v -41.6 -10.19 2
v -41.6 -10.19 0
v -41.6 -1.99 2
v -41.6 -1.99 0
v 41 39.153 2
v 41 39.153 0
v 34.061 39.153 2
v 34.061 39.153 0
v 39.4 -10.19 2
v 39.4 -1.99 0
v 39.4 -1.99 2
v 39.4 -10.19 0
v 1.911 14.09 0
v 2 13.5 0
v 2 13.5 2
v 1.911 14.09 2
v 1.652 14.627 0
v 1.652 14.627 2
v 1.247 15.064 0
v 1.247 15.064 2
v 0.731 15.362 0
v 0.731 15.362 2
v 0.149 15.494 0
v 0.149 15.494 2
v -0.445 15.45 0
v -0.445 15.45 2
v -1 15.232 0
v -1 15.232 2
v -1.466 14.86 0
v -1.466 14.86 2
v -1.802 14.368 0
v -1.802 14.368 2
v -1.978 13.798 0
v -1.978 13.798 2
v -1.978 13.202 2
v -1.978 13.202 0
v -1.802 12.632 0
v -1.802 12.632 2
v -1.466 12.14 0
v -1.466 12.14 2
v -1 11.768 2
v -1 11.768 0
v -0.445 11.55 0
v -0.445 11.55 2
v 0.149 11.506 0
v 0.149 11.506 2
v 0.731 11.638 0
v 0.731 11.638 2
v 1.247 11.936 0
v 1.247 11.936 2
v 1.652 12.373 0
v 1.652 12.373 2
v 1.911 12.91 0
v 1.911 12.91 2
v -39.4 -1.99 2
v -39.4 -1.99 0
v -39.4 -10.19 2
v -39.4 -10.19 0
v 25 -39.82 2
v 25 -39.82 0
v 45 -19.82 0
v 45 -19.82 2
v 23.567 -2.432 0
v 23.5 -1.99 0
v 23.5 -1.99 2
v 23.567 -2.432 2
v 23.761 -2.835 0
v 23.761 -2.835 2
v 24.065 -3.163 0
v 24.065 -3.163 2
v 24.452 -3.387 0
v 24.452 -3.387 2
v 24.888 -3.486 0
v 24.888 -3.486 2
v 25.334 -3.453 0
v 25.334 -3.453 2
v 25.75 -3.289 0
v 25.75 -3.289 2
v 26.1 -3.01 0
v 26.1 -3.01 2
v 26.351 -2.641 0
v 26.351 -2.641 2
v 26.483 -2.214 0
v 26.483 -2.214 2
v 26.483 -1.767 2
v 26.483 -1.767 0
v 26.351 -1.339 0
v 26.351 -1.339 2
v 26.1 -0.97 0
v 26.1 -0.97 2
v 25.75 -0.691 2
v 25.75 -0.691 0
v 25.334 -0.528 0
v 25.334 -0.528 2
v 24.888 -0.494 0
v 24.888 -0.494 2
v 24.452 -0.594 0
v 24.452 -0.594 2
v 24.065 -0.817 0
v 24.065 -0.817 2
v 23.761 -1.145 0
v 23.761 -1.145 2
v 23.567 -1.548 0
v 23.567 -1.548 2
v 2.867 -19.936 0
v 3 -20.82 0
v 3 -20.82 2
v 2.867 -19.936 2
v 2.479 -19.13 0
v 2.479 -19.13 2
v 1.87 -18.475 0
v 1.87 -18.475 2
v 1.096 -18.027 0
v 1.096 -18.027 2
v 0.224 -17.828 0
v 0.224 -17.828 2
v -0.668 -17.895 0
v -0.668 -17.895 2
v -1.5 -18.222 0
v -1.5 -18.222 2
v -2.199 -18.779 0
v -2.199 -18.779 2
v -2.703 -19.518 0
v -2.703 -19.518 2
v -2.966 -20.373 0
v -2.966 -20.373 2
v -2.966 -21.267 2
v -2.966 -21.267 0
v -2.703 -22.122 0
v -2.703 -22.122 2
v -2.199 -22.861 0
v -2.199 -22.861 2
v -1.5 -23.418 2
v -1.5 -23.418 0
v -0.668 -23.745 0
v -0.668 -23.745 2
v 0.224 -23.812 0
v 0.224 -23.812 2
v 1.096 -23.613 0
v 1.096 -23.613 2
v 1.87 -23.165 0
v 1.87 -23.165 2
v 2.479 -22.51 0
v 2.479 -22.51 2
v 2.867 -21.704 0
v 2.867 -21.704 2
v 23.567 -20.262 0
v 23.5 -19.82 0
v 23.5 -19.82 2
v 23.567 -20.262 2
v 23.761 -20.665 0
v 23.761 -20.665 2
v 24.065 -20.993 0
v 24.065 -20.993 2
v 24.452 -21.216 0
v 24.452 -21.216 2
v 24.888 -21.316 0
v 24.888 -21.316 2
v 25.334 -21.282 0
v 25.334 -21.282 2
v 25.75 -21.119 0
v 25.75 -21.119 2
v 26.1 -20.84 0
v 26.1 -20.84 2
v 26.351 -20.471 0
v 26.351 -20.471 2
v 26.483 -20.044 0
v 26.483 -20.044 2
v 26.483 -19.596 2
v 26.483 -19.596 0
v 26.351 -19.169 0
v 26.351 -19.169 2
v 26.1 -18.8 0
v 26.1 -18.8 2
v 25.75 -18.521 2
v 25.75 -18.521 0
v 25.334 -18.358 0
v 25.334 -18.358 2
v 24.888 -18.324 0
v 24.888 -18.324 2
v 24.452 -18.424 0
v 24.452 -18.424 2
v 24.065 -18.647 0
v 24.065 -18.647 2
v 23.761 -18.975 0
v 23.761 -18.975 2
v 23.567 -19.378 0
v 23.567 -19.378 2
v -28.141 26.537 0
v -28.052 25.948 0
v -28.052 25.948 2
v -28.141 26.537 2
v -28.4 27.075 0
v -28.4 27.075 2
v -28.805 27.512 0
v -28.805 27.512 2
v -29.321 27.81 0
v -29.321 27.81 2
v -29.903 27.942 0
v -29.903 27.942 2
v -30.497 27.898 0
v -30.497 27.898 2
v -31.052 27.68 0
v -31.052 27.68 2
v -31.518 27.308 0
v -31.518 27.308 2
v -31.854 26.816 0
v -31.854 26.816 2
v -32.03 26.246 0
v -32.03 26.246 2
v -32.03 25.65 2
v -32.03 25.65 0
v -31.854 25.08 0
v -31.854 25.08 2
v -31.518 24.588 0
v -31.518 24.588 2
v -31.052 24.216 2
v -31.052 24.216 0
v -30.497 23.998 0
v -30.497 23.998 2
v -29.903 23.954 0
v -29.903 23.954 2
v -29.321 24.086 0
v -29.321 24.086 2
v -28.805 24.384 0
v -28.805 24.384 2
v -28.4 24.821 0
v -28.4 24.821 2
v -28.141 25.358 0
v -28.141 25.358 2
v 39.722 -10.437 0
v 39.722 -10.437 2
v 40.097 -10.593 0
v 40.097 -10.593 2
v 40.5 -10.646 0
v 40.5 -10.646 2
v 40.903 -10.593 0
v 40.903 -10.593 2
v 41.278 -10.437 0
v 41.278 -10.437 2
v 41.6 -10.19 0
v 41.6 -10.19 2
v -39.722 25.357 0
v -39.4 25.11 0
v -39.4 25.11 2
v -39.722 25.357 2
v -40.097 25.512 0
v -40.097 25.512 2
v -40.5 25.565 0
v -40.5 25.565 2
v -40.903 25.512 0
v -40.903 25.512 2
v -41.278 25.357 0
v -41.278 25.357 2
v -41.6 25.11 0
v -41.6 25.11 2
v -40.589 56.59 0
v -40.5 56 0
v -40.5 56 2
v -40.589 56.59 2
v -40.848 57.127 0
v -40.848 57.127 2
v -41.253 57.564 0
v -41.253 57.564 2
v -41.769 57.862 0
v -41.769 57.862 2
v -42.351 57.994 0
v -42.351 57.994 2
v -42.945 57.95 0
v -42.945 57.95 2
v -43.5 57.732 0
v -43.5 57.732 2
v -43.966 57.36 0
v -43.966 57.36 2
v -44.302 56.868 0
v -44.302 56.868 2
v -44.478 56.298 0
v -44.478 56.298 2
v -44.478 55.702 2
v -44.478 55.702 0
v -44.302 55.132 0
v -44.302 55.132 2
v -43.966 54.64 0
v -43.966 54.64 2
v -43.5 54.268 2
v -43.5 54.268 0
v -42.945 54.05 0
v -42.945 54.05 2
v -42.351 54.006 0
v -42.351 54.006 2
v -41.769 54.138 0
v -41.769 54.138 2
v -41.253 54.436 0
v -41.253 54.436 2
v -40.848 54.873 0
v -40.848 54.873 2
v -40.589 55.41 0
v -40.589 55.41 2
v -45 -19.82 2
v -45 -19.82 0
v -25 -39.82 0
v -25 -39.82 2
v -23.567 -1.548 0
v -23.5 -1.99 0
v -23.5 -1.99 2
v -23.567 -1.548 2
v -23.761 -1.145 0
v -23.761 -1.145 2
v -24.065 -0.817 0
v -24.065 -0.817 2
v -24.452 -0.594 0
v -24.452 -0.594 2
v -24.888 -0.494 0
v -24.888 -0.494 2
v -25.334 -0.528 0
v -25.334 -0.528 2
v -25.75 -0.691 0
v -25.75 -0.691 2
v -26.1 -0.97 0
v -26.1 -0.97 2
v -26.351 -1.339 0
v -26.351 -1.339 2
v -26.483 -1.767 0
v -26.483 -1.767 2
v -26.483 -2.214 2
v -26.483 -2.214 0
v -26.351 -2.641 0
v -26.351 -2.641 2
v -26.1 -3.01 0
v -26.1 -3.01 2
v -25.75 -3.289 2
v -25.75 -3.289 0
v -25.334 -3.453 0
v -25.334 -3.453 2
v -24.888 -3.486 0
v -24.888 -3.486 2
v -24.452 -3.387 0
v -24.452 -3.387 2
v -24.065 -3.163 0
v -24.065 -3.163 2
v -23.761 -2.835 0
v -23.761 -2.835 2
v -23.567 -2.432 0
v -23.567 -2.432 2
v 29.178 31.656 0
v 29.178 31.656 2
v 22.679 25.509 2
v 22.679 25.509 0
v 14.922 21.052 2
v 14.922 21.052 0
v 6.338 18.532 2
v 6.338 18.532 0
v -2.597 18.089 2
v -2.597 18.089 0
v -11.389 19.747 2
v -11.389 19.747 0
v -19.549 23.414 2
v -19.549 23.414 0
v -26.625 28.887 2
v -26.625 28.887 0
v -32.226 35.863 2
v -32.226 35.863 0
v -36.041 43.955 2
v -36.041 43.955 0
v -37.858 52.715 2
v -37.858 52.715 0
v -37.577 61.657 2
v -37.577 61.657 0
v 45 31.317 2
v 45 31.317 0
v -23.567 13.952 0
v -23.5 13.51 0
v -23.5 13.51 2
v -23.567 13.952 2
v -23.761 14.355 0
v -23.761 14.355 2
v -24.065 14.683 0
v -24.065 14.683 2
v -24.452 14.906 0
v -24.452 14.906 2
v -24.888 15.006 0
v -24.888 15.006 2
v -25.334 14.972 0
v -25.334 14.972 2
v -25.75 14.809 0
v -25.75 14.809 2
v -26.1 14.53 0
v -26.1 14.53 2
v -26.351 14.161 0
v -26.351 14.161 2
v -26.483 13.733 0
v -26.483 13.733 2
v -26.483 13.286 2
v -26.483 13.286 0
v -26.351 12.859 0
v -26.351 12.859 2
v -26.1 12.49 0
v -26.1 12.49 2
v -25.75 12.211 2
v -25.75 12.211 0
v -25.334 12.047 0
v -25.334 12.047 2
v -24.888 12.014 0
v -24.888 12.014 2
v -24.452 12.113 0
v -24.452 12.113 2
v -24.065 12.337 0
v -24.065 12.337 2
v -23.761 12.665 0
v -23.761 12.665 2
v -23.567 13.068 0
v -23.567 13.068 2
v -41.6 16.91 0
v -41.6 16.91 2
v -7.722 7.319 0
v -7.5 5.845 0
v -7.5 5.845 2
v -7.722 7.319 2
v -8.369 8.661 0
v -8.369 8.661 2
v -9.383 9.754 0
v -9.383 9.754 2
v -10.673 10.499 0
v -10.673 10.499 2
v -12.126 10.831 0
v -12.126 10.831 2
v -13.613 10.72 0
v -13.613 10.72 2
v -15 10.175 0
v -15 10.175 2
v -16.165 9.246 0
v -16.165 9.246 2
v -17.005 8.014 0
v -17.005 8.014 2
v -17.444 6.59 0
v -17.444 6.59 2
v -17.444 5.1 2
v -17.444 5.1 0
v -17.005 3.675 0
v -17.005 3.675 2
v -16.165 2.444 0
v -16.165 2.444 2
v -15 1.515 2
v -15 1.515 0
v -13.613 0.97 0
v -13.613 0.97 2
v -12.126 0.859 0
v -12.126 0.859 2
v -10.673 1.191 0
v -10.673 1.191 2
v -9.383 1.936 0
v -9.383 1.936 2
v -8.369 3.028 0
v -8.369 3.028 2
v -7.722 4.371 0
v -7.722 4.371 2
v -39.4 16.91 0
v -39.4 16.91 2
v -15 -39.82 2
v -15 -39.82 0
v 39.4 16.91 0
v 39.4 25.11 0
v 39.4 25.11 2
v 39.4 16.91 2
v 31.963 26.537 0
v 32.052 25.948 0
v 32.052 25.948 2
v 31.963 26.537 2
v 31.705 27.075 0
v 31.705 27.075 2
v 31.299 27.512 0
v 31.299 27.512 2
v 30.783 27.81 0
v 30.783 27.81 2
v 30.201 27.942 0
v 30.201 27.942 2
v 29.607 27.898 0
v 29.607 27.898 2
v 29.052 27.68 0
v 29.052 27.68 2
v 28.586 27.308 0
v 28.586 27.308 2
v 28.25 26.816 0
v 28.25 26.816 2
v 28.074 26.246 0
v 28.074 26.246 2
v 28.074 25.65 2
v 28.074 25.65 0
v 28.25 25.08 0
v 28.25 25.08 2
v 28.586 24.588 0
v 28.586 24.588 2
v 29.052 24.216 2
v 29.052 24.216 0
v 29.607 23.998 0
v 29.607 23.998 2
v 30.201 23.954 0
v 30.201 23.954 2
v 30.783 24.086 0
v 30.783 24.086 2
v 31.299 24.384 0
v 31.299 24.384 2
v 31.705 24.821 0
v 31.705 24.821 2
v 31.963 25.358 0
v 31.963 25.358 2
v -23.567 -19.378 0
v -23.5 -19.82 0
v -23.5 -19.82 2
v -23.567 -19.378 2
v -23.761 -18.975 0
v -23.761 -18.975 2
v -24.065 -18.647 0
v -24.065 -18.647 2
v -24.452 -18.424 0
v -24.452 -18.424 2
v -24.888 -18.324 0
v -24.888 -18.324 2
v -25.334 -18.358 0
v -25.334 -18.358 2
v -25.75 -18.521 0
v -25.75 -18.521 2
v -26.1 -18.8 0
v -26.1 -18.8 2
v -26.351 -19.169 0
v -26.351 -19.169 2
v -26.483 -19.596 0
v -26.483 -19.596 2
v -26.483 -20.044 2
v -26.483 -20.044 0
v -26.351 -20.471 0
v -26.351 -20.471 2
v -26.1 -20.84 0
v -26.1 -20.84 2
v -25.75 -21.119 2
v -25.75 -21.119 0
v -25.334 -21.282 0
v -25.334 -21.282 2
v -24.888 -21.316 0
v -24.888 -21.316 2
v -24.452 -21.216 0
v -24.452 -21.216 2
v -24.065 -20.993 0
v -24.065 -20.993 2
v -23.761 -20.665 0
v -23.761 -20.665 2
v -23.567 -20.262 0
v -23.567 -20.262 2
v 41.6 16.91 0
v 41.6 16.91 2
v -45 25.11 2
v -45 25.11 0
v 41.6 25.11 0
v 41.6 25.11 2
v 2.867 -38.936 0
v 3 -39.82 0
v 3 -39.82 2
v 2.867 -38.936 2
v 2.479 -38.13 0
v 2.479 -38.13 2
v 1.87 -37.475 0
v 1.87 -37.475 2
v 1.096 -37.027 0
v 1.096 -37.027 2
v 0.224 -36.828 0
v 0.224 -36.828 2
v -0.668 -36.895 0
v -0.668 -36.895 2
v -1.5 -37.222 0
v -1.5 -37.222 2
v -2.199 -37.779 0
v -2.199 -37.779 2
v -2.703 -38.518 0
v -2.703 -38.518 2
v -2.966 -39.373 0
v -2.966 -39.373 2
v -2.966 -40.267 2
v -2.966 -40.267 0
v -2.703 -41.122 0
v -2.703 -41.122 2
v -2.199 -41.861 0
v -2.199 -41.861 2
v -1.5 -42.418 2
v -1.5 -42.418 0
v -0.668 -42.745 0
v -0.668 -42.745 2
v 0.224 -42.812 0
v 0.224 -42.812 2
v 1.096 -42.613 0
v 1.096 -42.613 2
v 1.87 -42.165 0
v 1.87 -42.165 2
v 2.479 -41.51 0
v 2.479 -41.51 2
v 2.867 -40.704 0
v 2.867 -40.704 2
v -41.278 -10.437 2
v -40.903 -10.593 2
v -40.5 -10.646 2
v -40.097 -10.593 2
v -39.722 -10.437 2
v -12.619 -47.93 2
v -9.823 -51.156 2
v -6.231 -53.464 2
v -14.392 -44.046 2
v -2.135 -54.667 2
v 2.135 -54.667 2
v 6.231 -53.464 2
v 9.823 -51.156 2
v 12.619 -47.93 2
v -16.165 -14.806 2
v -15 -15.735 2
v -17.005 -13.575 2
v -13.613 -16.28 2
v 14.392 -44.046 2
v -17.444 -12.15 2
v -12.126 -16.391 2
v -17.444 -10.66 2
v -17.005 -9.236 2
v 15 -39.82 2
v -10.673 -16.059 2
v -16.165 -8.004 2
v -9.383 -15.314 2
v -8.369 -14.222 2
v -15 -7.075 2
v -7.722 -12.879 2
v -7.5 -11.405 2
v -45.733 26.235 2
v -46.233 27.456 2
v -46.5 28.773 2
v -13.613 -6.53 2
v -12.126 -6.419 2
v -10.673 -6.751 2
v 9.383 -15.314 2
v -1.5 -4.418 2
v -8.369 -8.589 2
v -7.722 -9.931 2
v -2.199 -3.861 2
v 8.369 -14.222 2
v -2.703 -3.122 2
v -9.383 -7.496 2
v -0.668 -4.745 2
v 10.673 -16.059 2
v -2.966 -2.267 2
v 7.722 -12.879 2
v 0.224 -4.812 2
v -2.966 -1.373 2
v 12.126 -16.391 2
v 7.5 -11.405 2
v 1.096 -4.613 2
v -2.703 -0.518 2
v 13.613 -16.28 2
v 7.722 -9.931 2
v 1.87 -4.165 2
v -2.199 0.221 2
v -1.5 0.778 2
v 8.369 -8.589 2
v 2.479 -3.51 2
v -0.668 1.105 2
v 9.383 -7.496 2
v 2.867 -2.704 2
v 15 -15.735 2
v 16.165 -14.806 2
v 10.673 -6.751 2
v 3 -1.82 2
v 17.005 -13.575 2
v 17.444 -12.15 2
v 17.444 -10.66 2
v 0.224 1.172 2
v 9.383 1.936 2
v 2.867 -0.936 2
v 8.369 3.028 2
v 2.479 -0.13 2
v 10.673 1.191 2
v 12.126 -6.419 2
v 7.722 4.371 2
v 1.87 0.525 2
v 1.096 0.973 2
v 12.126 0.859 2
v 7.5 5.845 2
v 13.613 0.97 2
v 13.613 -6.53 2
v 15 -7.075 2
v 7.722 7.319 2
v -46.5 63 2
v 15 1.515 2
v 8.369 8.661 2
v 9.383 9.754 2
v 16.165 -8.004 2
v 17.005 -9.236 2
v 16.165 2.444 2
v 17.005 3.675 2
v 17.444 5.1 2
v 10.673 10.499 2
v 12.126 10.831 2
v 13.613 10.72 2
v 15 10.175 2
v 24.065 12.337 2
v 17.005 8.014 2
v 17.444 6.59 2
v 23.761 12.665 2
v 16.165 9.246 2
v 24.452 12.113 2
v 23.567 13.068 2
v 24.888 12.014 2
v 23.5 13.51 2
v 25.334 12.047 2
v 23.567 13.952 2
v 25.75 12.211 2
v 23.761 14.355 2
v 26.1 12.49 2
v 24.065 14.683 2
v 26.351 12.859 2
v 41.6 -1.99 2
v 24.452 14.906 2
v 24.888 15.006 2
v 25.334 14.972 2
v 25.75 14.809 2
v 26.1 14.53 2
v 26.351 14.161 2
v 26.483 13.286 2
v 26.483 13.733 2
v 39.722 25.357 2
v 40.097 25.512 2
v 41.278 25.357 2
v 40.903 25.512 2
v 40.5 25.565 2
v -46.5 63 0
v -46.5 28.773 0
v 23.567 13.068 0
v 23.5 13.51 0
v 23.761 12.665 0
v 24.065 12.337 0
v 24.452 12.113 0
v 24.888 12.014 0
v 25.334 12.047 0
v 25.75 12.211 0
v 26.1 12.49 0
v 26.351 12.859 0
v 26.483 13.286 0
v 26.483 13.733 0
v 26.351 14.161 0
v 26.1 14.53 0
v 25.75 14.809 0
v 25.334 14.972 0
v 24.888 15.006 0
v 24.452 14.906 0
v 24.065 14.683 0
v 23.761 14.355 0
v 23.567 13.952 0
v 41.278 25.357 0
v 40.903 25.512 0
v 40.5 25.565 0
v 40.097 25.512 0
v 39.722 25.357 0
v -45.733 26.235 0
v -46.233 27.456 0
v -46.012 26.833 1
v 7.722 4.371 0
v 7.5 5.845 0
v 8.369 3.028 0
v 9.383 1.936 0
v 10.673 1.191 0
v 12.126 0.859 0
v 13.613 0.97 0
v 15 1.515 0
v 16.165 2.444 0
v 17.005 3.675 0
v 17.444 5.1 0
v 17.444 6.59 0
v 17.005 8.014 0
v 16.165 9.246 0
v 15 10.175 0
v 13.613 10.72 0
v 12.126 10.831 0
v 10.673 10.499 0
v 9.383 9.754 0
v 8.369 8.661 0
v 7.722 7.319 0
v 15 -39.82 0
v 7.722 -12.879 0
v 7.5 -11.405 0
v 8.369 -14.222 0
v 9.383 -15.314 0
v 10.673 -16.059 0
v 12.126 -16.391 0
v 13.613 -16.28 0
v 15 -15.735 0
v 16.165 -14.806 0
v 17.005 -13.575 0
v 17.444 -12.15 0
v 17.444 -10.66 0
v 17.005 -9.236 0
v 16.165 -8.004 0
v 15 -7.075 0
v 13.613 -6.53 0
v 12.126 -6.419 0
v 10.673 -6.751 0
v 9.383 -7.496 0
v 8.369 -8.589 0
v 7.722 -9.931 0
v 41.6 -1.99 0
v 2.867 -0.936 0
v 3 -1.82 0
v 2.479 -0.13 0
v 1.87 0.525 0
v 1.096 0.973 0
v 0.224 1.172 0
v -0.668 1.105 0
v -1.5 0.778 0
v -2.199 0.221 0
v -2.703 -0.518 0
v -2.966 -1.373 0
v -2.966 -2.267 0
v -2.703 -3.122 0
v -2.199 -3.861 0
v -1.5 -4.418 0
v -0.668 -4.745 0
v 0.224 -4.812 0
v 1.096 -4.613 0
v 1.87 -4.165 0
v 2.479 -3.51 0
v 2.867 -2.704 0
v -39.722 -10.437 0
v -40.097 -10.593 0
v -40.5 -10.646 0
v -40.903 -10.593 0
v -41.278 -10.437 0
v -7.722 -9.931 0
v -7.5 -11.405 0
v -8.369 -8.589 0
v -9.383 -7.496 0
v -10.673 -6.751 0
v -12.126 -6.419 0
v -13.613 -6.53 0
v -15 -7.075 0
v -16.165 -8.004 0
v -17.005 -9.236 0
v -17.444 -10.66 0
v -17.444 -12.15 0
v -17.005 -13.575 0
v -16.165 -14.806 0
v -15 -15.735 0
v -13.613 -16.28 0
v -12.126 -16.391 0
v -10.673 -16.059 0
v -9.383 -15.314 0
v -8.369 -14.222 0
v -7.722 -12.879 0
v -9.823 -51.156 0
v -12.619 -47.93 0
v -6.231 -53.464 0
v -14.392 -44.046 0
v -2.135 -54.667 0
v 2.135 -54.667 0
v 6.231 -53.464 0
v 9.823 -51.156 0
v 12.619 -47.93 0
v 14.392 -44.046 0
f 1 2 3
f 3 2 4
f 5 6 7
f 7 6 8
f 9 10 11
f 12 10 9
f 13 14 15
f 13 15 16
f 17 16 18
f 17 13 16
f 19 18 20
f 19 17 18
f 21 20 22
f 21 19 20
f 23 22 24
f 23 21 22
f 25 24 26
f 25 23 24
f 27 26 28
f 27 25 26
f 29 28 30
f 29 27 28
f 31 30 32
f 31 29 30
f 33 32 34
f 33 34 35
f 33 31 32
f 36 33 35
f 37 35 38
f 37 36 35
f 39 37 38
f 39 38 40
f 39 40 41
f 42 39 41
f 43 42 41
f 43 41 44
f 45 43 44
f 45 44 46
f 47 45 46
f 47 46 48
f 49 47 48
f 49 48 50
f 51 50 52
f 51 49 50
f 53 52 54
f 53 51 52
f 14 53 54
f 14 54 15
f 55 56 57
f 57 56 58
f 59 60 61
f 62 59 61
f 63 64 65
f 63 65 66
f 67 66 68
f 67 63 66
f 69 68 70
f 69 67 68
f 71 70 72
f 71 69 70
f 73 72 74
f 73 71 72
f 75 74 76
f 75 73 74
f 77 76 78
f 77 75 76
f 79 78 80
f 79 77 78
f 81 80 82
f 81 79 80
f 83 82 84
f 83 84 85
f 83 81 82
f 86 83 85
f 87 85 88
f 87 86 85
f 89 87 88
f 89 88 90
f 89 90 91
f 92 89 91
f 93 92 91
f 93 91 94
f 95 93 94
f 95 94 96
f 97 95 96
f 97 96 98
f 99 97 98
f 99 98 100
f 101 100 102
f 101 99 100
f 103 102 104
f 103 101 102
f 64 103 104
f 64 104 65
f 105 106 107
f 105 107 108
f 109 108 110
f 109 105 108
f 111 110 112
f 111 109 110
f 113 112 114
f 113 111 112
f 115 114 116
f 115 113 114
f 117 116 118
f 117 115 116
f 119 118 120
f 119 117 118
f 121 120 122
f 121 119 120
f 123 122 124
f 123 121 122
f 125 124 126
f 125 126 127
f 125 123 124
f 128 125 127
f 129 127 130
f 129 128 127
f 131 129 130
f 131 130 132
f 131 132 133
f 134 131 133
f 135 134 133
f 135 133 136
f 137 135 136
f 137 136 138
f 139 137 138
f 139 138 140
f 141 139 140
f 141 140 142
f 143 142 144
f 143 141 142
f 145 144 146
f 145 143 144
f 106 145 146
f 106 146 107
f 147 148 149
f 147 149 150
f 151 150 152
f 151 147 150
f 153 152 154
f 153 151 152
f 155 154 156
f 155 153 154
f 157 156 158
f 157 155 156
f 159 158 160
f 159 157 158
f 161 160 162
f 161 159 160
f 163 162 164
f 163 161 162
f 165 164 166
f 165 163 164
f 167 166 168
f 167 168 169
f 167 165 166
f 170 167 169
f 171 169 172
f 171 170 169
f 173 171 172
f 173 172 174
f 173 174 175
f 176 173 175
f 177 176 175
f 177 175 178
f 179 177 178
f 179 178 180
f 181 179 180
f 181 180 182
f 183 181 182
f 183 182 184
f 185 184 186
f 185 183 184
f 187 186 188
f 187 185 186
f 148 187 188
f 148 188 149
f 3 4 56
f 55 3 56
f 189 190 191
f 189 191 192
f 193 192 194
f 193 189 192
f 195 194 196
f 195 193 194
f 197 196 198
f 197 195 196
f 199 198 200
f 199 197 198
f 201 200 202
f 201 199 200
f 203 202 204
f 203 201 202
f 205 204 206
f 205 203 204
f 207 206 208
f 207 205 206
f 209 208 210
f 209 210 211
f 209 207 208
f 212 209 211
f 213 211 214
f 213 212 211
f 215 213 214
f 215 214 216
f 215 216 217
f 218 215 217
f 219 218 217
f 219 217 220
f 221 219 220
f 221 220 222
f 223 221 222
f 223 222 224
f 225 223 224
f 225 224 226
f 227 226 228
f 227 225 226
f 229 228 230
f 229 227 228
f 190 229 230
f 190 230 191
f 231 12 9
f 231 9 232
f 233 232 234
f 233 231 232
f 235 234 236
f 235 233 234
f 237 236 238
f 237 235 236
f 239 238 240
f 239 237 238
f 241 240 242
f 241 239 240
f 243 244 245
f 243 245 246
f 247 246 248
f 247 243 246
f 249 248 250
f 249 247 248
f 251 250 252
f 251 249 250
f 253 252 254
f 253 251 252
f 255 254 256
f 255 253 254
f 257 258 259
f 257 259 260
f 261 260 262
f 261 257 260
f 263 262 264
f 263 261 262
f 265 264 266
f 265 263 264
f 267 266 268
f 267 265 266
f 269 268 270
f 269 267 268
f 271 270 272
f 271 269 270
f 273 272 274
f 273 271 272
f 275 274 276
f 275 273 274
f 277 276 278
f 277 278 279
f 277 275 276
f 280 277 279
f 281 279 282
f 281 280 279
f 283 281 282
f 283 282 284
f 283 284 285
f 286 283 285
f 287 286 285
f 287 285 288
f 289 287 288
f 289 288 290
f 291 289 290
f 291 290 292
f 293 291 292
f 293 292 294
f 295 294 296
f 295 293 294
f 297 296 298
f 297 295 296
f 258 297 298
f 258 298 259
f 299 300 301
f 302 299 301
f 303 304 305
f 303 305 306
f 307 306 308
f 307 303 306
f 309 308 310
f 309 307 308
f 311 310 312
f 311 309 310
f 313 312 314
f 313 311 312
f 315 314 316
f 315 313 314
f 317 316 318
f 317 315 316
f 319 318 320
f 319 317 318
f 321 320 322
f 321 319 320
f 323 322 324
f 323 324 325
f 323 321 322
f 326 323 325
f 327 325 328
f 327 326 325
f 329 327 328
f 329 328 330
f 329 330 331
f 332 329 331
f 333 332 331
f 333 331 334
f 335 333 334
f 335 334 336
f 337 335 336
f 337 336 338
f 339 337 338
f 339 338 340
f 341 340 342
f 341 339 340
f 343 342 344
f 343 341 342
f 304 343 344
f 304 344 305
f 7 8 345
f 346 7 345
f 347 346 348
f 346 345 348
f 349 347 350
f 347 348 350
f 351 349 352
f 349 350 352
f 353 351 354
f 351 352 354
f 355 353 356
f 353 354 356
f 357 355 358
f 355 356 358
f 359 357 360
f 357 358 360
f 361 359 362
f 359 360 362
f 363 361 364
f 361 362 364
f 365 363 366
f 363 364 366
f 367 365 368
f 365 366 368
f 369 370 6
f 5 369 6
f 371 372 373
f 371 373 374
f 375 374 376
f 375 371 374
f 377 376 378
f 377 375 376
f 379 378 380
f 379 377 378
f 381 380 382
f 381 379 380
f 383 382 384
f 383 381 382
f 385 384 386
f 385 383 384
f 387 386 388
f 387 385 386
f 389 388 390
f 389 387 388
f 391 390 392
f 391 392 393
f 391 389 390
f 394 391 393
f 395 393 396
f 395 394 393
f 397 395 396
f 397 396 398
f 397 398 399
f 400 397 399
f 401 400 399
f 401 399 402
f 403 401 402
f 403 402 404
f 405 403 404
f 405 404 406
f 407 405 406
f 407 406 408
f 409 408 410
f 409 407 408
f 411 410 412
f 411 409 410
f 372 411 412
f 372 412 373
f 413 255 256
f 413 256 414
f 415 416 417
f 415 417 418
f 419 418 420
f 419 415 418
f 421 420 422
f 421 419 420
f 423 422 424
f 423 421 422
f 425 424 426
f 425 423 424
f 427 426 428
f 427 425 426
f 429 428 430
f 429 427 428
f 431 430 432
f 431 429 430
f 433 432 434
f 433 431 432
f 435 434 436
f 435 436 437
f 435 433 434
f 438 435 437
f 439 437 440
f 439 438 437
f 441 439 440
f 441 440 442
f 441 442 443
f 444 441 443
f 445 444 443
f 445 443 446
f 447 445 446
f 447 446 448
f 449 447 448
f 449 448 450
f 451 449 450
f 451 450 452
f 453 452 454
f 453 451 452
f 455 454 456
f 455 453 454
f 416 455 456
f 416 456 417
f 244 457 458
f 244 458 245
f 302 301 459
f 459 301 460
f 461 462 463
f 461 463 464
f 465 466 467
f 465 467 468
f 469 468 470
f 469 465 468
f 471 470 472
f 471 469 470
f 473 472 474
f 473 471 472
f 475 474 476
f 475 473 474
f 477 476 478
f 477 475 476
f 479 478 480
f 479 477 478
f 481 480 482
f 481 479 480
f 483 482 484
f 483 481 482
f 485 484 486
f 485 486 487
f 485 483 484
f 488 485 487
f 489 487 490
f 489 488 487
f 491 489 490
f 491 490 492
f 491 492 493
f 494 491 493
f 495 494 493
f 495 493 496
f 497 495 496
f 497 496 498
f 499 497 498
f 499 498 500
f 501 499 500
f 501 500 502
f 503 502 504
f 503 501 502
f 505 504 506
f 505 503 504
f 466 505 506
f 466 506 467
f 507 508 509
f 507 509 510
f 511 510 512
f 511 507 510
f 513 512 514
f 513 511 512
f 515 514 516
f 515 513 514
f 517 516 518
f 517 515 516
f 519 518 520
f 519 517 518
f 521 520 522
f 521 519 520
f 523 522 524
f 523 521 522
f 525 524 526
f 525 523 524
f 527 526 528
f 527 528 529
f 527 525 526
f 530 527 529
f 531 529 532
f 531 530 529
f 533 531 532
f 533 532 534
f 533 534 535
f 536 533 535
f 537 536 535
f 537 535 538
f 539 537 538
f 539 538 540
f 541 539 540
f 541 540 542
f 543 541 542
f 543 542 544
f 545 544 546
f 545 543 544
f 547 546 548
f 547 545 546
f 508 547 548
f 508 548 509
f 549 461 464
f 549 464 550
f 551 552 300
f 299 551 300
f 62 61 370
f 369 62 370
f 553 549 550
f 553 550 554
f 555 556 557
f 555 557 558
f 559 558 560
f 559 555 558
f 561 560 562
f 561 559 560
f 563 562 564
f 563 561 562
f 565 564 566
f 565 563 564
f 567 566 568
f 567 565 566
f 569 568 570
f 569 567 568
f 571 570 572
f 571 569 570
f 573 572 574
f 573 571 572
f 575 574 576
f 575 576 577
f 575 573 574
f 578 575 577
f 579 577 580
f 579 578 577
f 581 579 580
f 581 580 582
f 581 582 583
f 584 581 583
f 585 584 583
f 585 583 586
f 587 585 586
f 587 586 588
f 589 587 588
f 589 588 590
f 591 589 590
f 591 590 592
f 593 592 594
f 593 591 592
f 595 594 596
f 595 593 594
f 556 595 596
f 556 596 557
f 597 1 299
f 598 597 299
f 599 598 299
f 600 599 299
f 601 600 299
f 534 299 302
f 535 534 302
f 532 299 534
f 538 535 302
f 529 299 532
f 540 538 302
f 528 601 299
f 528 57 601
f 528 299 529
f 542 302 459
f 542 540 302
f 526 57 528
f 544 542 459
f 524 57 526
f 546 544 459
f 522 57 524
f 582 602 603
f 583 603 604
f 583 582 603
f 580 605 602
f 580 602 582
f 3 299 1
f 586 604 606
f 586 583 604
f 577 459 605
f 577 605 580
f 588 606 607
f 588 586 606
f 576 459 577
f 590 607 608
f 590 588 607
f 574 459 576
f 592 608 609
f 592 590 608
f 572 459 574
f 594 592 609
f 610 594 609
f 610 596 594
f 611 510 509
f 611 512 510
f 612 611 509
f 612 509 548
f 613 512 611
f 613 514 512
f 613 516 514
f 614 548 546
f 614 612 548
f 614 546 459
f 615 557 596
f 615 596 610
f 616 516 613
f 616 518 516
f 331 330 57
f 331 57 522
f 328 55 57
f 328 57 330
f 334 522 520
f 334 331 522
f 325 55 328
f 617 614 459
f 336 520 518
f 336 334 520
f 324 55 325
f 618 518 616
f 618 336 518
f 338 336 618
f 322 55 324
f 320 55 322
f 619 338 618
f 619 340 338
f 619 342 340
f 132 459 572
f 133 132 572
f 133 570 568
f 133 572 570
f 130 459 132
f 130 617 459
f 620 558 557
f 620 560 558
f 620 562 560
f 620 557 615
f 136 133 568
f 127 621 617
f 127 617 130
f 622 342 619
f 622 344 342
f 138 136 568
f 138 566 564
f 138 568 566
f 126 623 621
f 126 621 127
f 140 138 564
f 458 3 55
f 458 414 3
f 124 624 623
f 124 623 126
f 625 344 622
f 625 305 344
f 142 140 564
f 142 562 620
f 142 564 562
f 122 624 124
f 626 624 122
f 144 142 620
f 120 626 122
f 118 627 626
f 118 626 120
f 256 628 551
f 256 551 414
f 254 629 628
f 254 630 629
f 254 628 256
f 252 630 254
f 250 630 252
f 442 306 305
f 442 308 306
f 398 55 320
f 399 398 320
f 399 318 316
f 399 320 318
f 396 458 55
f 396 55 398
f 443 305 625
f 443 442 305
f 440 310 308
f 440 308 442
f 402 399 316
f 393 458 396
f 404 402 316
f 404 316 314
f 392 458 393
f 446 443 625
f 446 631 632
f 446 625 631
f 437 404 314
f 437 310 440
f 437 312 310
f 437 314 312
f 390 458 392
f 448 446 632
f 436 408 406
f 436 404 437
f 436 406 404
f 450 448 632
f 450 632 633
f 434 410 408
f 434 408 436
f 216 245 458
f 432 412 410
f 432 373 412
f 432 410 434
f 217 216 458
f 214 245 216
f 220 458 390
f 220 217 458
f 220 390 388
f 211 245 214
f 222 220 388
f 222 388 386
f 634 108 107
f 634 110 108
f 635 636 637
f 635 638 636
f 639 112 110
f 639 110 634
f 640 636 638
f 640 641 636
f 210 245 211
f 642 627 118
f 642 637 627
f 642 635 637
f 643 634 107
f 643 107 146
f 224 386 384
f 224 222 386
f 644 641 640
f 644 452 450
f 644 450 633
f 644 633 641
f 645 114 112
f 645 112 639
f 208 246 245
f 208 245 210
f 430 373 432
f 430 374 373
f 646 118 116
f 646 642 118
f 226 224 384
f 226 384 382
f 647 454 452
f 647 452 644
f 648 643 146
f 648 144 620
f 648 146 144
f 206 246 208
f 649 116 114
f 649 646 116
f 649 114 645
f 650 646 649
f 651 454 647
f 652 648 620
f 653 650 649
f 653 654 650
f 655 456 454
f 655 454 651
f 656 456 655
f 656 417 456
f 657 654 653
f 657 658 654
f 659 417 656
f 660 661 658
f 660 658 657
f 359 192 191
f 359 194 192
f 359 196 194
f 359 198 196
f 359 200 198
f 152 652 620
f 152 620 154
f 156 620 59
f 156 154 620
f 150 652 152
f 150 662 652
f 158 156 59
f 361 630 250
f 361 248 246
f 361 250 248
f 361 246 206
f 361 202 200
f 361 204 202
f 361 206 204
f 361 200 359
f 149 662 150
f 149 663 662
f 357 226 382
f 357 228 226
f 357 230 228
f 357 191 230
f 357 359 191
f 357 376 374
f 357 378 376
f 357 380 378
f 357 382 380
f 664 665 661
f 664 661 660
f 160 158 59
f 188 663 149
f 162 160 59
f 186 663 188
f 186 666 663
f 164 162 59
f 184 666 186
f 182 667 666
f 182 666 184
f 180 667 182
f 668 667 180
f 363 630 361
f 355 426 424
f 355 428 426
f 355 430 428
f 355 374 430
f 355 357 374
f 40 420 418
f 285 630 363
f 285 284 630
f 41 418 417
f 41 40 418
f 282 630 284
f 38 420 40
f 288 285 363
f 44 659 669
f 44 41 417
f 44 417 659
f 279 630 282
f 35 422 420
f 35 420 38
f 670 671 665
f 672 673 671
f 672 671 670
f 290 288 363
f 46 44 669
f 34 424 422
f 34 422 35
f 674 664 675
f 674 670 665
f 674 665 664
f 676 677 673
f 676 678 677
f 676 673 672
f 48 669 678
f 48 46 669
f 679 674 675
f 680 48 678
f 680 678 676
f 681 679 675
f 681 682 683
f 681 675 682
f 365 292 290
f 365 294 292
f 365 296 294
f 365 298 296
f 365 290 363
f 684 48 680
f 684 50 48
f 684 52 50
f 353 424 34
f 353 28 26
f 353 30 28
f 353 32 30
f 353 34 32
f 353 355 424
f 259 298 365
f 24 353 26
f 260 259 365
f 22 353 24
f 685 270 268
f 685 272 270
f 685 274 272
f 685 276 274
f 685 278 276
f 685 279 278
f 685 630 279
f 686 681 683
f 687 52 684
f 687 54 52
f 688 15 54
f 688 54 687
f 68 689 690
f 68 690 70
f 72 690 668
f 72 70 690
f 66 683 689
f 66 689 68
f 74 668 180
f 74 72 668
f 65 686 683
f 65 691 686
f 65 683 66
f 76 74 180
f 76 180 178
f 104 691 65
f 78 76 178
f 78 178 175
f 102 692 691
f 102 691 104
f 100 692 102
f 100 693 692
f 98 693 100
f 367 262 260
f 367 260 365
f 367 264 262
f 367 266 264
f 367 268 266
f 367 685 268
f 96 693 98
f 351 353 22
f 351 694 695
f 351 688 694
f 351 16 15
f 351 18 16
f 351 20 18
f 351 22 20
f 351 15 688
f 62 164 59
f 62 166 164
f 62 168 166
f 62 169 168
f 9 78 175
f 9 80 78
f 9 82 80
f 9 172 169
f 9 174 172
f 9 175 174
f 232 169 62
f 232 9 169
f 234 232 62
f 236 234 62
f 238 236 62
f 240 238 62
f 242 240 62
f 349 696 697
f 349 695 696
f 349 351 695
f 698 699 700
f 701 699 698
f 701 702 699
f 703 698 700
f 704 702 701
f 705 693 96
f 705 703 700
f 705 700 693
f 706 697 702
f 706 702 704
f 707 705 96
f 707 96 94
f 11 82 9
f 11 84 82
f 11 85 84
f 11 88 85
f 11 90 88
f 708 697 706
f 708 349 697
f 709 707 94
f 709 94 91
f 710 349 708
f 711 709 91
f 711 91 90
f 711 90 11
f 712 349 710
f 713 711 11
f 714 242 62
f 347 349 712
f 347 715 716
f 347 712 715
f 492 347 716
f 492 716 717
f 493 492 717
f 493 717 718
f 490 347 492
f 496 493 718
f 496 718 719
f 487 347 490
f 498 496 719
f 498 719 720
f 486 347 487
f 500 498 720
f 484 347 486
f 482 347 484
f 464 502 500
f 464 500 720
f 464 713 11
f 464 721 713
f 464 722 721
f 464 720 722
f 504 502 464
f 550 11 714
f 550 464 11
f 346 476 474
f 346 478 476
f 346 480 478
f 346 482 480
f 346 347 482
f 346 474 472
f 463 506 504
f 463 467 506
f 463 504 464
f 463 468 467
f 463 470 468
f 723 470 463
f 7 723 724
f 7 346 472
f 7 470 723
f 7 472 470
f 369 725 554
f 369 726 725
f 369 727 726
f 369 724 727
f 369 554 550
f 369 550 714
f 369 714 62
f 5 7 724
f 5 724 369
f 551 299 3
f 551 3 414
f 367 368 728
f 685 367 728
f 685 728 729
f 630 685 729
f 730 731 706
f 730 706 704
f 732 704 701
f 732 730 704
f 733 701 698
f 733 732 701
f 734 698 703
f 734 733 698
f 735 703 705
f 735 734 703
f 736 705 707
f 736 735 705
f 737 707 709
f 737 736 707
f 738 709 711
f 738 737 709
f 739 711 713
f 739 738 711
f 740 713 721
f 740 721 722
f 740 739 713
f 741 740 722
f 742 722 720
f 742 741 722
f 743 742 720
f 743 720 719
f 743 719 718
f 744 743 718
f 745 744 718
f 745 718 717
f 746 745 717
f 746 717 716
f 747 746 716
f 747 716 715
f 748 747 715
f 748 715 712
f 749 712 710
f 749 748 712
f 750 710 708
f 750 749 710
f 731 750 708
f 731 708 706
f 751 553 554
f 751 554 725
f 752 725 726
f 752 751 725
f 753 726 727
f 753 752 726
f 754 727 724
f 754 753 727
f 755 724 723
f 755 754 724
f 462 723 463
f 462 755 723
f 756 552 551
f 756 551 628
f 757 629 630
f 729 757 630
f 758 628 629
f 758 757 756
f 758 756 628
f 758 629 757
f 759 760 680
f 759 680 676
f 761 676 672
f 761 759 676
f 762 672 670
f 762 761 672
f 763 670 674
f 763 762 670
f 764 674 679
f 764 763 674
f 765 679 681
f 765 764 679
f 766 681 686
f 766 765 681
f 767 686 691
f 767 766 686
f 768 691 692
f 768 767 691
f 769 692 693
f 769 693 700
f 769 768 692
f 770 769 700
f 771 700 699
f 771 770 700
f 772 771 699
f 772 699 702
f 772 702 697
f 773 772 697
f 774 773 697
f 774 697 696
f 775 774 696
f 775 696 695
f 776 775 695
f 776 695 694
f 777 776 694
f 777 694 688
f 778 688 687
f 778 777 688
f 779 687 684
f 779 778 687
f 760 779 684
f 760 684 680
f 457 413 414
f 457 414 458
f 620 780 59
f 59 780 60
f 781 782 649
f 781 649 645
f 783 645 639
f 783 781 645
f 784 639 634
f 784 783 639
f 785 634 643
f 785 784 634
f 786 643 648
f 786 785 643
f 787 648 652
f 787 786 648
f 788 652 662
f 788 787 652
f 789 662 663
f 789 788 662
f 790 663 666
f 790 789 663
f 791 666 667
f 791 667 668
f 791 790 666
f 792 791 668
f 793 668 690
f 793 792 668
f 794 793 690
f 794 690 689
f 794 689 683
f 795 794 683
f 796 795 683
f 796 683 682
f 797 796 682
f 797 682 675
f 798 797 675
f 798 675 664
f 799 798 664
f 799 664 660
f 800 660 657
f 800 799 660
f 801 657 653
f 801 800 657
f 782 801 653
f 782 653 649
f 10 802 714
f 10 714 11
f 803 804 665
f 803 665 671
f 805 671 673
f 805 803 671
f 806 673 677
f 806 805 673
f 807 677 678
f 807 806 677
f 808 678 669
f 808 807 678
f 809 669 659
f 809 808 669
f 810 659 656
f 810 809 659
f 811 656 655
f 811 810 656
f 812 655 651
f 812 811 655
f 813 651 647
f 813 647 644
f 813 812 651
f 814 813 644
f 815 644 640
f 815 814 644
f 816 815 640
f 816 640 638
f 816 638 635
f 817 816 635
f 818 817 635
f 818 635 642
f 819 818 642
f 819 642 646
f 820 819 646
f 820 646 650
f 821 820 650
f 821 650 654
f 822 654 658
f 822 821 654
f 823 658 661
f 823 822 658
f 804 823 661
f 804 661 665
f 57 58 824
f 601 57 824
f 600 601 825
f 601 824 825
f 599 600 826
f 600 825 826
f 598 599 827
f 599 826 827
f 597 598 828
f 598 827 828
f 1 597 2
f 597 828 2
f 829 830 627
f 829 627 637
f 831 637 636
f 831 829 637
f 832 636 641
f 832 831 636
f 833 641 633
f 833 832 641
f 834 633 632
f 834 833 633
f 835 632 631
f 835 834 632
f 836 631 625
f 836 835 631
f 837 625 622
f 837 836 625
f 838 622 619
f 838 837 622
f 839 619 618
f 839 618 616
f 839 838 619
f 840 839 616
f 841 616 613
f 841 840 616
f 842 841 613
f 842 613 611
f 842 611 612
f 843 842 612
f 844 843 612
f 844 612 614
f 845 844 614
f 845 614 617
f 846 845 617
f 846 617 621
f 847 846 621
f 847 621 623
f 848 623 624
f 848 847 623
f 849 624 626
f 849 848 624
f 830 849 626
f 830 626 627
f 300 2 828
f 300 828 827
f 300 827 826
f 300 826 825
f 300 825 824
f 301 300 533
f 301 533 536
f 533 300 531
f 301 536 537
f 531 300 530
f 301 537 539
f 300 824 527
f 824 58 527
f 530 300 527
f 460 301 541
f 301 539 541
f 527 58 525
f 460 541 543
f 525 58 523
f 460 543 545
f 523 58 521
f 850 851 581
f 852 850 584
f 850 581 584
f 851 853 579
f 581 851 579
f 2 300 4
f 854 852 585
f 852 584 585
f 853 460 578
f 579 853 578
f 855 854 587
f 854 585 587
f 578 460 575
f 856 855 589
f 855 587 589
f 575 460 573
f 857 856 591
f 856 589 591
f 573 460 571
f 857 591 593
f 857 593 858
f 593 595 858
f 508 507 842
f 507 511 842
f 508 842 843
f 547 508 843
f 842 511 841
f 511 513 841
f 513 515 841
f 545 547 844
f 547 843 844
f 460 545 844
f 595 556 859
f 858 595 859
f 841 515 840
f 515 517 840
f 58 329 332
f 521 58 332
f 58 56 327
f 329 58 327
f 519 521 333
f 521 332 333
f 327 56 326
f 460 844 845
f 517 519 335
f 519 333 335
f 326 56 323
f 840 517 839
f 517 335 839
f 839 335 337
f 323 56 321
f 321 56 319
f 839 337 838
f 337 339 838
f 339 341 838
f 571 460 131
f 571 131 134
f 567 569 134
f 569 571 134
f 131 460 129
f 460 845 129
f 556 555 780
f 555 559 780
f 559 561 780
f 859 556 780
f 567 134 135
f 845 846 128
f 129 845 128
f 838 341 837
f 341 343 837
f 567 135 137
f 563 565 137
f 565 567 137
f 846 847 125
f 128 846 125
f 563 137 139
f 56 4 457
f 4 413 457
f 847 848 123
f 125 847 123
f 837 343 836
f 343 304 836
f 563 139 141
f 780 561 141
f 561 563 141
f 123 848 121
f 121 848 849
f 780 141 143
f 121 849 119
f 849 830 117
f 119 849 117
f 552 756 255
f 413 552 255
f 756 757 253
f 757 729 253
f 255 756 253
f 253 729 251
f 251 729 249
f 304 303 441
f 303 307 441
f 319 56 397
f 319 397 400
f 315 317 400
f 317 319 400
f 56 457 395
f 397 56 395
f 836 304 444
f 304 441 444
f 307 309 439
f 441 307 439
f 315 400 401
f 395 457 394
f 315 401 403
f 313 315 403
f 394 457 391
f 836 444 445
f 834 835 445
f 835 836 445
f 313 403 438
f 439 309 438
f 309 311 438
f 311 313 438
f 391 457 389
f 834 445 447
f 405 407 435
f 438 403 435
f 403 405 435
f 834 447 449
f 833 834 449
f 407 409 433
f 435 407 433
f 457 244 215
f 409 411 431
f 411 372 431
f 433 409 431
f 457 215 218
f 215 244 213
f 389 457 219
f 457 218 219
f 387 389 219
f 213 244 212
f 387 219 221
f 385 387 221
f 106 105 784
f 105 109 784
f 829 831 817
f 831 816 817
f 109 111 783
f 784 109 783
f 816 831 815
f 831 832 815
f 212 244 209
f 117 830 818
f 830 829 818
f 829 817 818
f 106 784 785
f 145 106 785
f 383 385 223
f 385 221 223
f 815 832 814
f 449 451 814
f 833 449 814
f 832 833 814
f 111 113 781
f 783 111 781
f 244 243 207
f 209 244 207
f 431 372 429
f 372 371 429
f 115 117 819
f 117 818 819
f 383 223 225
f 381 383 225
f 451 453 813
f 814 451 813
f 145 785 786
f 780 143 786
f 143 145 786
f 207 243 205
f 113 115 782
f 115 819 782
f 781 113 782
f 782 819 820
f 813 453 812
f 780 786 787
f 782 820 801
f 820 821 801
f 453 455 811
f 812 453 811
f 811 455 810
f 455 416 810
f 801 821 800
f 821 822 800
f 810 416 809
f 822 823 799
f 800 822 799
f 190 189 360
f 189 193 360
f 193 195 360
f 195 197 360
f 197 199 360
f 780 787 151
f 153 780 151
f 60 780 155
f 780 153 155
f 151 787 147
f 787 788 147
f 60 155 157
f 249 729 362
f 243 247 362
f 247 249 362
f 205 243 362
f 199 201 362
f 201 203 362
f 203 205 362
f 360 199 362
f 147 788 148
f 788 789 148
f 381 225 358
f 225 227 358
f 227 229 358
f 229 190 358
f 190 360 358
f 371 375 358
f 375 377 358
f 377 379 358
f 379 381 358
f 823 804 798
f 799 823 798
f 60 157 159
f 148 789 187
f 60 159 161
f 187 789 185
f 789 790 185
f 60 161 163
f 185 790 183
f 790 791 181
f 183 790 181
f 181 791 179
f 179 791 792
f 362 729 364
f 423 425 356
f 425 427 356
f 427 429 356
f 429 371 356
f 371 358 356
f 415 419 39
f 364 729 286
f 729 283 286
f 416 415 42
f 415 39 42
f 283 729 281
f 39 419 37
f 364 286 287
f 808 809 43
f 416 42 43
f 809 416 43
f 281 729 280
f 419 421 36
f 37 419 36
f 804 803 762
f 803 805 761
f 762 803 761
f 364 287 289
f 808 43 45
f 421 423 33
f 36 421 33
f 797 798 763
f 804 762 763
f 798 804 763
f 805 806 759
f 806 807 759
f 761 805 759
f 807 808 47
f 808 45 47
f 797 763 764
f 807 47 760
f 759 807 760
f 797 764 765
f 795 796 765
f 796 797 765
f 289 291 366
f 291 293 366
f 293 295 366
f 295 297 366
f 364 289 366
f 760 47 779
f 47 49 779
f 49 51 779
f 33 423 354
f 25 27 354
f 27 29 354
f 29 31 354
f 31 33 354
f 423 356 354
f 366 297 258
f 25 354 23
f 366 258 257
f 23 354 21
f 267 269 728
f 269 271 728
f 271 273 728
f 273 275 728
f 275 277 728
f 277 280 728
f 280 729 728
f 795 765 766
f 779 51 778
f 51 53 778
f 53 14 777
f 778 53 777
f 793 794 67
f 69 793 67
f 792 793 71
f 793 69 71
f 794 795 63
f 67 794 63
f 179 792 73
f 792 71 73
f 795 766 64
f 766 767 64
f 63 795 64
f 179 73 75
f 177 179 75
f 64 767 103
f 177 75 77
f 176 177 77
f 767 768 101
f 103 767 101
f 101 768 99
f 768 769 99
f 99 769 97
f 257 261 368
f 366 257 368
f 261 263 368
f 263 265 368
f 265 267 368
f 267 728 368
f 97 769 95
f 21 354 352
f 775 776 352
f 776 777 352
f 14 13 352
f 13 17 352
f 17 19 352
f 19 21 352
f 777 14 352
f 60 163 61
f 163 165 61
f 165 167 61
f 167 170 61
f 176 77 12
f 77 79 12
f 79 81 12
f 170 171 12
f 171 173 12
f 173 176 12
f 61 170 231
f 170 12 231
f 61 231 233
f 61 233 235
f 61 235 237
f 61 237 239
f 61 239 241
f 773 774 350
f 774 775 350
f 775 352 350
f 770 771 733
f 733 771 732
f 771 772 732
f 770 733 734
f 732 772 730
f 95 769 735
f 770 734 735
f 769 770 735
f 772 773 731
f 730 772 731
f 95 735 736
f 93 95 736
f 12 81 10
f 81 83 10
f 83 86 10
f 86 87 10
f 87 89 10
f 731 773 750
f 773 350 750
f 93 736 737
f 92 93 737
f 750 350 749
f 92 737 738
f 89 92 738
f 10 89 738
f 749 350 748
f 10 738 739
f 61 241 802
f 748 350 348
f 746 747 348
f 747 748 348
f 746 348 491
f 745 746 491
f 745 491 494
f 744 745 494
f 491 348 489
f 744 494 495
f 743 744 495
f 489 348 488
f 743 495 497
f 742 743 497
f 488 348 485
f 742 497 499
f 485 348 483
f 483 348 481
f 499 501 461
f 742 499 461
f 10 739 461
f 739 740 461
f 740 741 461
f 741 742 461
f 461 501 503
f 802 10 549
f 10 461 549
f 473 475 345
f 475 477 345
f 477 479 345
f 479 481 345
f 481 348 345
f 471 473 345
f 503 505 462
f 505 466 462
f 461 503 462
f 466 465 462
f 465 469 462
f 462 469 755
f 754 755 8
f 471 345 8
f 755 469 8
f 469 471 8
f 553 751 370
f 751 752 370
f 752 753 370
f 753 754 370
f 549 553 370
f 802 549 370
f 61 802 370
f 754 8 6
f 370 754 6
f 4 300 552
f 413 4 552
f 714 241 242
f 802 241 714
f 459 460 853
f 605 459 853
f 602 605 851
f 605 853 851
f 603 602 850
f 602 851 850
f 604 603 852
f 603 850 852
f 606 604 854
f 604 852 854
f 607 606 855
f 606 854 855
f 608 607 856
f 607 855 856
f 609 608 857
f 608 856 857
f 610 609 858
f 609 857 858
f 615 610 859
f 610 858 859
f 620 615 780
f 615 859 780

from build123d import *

# Parameters (mm, degrees)
SKETCH_3_R      = 3
SKETCH_3_R_2    = 2
SKETCH_3_R_3    = 1.5
SKETCH_3_R_4    = 5
EXTRUDE_1_DEPTH = 2


with BuildPart() as part:
    # 草图3 → 凸台-拉伸1 (new body)
    with BuildSketch(Plane.XY):
        with BuildLine():
            Line((-45, -3.990216685), (-45, -19.82))
            Line((-45, -19.82), (-25, -39.82))
            Line((-25, -39.82), (-15, -39.82))
            ThreePointArc((-15, -39.82), (0, -54.82), (15, -39.82))
            Line((15, -39.82), (25, -39.82))
            Line((25, -39.82), (45, -19.82))
            Line((45, -19.82), (45, -3.990216685))
            Line((45, -3.990216685), (45, 31.317051182))
            Line((45, 31.317051182), (41, 39.152540881))
            Line((41, 39.152540881), (34.06116735, 39.152540881))
            ThreePointArc((34.06116735, 39.152540881), (-11.38853896, 19.746708007), (-37.576612526, 61.656694359))
            Line((-37.576612526, 61.656694359), (-46.5, 63))
            Line((-46.5, 63), (-46.5, 28.773494756))
            add(Edge.make_bspline(
                [(-45, 25.109783315), (-46.274240542, 26.725120767), (-46.5, 28.773494756)],
                knots=[0, 0, 0, 1, 1, 1], degree=2))
            Line((-45, 25.109783315), (-45, -3.990216685))
        make_face()
        with Locations((0, -1.82)):
            Circle(SKETCH_3_R, mode=Mode.SUBTRACT)
        with Locations((0, 13.5)):
            Circle(SKETCH_3_R_2, mode=Mode.SUBTRACT)
        with Locations((-30.0520382, 25.9479618)):
            Circle(SKETCH_3_R_2, mode=Mode.SUBTRACT)
        with Locations((-42.5, 56)):
            Circle(SKETCH_3_R_2, mode=Mode.SUBTRACT)
        with Locations((30.0520382, 25.9479618)):
            Circle(SKETCH_3_R_2, mode=Mode.SUBTRACT)
        with Locations((0, -20.82)):
            Circle(SKETCH_3_R, mode=Mode.SUBTRACT)
        with Locations((0, -39.82)):
            Circle(SKETCH_3_R, mode=Mode.SUBTRACT)
        with Locations((-25, -1.990216685)):
            Circle(SKETCH_3_R_3, mode=Mode.SUBTRACT)
        with Locations((-25, -19.82)):
            Circle(SKETCH_3_R_3, mode=Mode.SUBTRACT)
        with Locations((-25, 13.509783315)):
            Circle(SKETCH_3_R_3, mode=Mode.SUBTRACT)
        with Locations(Location((25, 13.509783315, 0), (0, 0, 180))):
            Circle(SKETCH_3_R_3, mode=Mode.SUBTRACT)
        with Locations(Location((25, -19.82, 0), (0, 0, 180))):
            Circle(SKETCH_3_R_3, mode=Mode.SUBTRACT)
        with Locations(Location((25, -1.990216685, 0), (0, 0, 180))):
            Circle(SKETCH_3_R_3, mode=Mode.SUBTRACT)
        with Locations((-12.5, -11.405108343)):
            Circle(SKETCH_3_R_4, mode=Mode.SUBTRACT)
        with Locations((-12.5, 5.844891657)):
            Circle(SKETCH_3_R_4, mode=Mode.SUBTRACT)
        with Locations(Location((12.5, 5.844891657, 0), (0, 0, 180))):
            Circle(SKETCH_3_R_4, mode=Mode.SUBTRACT)
        with Locations(Location((12.5, -11.405108343, 0), (0, 0, 180))):
            Circle(SKETCH_3_R_4, mode=Mode.SUBTRACT)
        with BuildLine():
            Line((-41.6, -1.990216685), (-39.4, -1.990216685))
            Line((-39.4, -1.990216685), (-39.4, -10.190216685))
            ThreePointArc((-39.4, -10.190216685), (-40.5, -10.645851604), (-41.6, -10.190216685))
            Line((-41.6, -10.190216685), (-41.6, -1.990216685))
        make_face(mode=Mode.SUBTRACT)
        with BuildLine():
            Line((41.6, -10.190216685), (41.6, -1.990216685))
            Line((41.6, -1.990216685), (39.4, -1.990216685))
            Line((39.4, -1.990216685), (39.4, -10.190216685))
            ThreePointArc((39.4, -10.190216685), (40.5, -10.645851604), (41.6, -10.190216685))
        make_face(mode=Mode.SUBTRACT)
        with BuildLine():
            Line((39.4, 25.109783315), (39.4, 16.909783315))
            Line((39.4, 16.909783315), (41.6, 16.909783315))
            Line((41.6, 16.909783315), (41.6, 25.109783315))
            ThreePointArc((41.6, 25.109783315), (40.5, 25.565418233), (39.4, 25.109783315))
        make_face(mode=Mode.SUBTRACT)
        with BuildLine():
            Line((-41.6, 25.109783315), (-41.6, 16.909783315))
            Line((-41.6, 16.909783315), (-39.4, 16.909783315))
            Line((-39.4, 16.909783315), (-39.4, 25.109783315))
            ThreePointArc((-39.4, 25.109783315), (-40.5, 25.565418233), (-41.6, 25.109783315))
        make_face(mode=Mode.SUBTRACT)
    extrude(amount=EXTRUDE_1_DEPTH)


solid = part.part
